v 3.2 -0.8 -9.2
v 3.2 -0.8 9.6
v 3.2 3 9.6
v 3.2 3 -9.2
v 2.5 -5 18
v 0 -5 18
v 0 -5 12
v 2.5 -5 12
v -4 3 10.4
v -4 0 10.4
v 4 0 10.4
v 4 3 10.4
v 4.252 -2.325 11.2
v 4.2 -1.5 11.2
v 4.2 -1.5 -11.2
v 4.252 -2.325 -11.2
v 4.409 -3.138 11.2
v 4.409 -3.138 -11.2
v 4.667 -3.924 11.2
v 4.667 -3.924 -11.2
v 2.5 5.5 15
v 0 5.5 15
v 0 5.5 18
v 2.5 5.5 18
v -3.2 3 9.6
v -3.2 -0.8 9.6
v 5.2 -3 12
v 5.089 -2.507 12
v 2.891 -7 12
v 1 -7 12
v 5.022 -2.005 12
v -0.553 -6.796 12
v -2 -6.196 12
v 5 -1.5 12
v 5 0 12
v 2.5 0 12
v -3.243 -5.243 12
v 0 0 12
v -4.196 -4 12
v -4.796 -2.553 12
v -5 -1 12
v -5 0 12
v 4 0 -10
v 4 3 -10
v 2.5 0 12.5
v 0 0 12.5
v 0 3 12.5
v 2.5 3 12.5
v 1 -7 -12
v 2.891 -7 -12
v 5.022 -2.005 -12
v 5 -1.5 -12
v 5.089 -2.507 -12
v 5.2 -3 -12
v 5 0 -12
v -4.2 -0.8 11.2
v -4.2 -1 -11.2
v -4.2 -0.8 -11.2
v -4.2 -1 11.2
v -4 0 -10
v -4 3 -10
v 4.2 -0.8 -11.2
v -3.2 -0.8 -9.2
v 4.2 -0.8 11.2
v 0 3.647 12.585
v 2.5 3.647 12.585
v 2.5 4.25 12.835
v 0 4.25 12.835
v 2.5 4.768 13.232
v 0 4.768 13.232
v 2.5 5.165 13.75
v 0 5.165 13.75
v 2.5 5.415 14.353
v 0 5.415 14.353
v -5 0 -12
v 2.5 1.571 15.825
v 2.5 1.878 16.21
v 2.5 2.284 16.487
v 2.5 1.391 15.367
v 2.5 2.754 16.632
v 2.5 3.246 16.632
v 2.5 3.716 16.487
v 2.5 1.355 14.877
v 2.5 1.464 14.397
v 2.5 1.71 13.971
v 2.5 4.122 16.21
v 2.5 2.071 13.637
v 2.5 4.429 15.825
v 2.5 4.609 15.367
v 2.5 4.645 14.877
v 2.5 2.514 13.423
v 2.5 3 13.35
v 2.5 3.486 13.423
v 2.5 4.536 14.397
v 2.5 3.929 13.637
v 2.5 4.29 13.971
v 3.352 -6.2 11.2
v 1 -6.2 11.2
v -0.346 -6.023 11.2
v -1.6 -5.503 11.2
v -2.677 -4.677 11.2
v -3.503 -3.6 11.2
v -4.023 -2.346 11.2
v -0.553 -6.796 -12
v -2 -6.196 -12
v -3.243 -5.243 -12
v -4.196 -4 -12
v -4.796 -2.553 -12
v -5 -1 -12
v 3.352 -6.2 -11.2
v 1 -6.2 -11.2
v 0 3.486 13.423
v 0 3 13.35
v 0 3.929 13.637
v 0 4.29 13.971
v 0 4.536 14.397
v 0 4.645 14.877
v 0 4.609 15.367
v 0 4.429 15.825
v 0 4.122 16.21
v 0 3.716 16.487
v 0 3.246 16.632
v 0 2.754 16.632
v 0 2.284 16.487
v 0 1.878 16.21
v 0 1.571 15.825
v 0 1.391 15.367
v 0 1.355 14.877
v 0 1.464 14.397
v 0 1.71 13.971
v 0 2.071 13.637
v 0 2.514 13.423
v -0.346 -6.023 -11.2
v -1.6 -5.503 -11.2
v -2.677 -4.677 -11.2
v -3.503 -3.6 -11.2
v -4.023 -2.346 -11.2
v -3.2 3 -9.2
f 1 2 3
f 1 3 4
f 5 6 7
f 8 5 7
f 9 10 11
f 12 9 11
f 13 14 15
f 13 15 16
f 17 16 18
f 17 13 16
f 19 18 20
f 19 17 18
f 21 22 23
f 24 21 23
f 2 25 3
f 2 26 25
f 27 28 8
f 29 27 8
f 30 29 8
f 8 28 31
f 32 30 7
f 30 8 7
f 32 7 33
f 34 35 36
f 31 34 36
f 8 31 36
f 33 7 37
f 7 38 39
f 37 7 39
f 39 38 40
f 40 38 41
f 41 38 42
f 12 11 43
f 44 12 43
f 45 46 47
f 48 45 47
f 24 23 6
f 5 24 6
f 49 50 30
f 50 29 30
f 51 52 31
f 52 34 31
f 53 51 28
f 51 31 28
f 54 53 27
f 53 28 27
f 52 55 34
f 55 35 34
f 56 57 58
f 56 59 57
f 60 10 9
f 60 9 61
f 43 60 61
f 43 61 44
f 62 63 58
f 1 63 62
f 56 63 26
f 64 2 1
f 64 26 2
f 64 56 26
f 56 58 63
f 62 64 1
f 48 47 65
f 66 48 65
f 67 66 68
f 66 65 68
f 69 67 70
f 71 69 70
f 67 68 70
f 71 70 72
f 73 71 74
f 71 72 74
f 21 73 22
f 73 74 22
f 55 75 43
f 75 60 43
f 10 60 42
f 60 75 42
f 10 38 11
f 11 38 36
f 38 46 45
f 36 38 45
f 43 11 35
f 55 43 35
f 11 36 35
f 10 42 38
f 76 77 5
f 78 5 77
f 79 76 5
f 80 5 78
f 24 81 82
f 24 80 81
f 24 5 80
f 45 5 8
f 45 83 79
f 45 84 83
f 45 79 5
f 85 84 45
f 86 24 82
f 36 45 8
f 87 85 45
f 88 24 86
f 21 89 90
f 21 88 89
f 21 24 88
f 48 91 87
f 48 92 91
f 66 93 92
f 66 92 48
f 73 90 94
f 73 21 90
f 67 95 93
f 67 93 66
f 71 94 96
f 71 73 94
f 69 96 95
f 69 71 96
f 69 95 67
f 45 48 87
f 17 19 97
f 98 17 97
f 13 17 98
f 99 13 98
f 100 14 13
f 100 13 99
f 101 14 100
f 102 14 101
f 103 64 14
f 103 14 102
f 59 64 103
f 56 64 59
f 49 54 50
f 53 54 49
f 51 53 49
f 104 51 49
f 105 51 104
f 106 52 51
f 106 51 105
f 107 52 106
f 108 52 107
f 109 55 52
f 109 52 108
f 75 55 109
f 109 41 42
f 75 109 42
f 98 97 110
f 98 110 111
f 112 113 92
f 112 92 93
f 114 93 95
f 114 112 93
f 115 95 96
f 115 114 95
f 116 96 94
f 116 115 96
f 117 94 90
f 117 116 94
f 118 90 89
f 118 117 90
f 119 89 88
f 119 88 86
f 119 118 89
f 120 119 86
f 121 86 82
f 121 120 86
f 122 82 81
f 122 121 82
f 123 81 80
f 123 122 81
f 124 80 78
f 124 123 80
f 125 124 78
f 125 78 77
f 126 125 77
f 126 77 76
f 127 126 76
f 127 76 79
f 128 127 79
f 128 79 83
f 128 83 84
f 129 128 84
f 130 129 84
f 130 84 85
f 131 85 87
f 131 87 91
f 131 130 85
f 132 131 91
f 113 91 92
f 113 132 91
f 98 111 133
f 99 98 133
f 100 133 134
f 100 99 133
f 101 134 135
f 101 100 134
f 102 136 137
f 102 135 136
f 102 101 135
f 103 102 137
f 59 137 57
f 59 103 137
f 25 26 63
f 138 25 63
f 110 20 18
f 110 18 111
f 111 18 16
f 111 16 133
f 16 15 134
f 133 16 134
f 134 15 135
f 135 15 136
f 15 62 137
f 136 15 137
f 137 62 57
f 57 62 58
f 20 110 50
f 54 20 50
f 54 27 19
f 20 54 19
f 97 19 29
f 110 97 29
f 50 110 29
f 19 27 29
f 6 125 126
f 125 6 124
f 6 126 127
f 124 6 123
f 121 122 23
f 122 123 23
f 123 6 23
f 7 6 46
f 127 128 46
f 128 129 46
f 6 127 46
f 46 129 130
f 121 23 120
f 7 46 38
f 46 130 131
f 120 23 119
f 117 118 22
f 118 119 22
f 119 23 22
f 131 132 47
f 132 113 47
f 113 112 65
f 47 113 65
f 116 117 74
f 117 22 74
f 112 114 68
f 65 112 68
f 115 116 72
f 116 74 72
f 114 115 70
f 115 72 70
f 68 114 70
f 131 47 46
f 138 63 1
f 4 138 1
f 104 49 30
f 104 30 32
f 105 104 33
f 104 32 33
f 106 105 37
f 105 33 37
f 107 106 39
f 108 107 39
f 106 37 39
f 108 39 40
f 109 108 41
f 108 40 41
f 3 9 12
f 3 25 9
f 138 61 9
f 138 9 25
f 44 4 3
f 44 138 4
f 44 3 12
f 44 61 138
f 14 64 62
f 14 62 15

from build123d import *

# Parameters (mm, degrees)
RESSALTO_EXTRUS_O1_DEPTH = 12
ESBO_O4_W                = 8
ESBO_O4_H                = 20.4
RESSALTO_EXTRUS_O2_DEPTH = 3
CASCA2_T                 = -0.8
ESBO_O5_R                = 1.65
RESSALTO_EXTRUS_O3_DEPTH = 2.5


with BuildPart() as part:
    # Esboço1 → Ressalto-extrusão1 (new body, symmetric)
    with BuildSketch(Plane.XY):
        with BuildLine():
            Line((-5, 0), (5, 0))
            Line((5, 0), (5, -1.5))
            ThreePointArc((5, -1.5), (5.050220269, -2.256637298), (5.2, -3))
            Line((5.2, -3), (2.890598923, -7))
            Line((2.890598923, -7), (1, -7))
            ThreePointArc((1, -7), (-3.242640687, -5.242640687), (-5, -1))
            Line((-5, -1), (-5, 0))
        make_face()
    extrude(amount=RESSALTO_EXTRUS_O1_DEPTH, both=True)

    # Esboço4 → Ressalto-extrusão2 (add)
    with BuildSketch(Plane(origin=(0, 0, 0), x_dir=(1, 0, 0), z_dir=(0, 1, 0))):
        with Locations((0, -0.2)):
            Rectangle(ESBO_O4_W, ESBO_O4_H)
    extrude(amount=RESSALTO_EXTRUS_O2_DEPTH)

    # Casca2
    casca2_openings = [part.faces().sort_by_distance(p)[0] for p in [
        (4.045299462, -5, 0),
        (0, 3, 0.2),
    ]]
    offset(amount=CASCA2_T, openings=casca2_openings, kind=Kind.INTERSECTION)

    # Esboço5 → Ressalto-extrusão3 (add)
    with BuildSketch(Plane(origin=(0, 0, 0), x_dir=(0, 0, -1), z_dir=(1, 0, 0))):
        with BuildLine():
            Line((-12, 0), (-12.5, 0))
            Line((-12.5, 0), (-12.5, 3))
            ThreePointArc((-12.5, 3), (-13.232233047, 4.767766953), (-15, 5.5))
            Line((-15, 5.5), (-18, 5.5))
            Line((-18, 5.5), (-18, -5))
            Line((-18, -5), (-12, -5))
            Line((-12, -5), (-12, 0))
        make_face()
        with Locations((-15, 3)):
            Circle(ESBO_O5_R, mode=Mode.SUBTRACT)
    extrude(amount=RESSALTO_EXTRUS_O3_DEPTH)


solid = part.part
